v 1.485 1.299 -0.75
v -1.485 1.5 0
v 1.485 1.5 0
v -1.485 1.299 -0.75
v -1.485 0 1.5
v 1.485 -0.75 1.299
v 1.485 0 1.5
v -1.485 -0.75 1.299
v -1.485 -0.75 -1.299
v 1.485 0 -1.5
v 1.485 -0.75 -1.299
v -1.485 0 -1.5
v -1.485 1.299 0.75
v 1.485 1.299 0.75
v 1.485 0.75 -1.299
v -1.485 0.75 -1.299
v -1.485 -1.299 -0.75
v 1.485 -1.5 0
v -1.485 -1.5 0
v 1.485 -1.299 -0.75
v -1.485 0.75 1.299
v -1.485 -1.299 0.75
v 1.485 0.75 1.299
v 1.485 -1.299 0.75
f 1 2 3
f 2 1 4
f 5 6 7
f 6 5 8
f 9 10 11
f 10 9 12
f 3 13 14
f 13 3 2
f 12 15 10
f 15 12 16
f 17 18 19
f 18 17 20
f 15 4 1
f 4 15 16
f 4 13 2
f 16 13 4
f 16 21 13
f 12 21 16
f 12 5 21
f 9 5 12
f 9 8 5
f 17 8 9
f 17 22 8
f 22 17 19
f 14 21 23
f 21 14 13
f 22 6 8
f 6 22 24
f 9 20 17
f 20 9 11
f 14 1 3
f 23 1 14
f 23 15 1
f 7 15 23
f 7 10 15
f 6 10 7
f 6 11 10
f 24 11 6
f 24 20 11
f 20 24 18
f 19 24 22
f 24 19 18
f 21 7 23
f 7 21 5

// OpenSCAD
translate([0.0,0,0.0]){
	rotate([90,0,0]){
		cylinder($fn = 12, h = 1.98, r1 = 1.0, r2 = 1.0, center = true);
	}
}
translate([0,0.0,0.0]){
	rotate([0,90,0]){
		cylinder($fn = 12, h = 2.97, r1 = 1.5, r2 = 1.5, center = true);
	}
}
